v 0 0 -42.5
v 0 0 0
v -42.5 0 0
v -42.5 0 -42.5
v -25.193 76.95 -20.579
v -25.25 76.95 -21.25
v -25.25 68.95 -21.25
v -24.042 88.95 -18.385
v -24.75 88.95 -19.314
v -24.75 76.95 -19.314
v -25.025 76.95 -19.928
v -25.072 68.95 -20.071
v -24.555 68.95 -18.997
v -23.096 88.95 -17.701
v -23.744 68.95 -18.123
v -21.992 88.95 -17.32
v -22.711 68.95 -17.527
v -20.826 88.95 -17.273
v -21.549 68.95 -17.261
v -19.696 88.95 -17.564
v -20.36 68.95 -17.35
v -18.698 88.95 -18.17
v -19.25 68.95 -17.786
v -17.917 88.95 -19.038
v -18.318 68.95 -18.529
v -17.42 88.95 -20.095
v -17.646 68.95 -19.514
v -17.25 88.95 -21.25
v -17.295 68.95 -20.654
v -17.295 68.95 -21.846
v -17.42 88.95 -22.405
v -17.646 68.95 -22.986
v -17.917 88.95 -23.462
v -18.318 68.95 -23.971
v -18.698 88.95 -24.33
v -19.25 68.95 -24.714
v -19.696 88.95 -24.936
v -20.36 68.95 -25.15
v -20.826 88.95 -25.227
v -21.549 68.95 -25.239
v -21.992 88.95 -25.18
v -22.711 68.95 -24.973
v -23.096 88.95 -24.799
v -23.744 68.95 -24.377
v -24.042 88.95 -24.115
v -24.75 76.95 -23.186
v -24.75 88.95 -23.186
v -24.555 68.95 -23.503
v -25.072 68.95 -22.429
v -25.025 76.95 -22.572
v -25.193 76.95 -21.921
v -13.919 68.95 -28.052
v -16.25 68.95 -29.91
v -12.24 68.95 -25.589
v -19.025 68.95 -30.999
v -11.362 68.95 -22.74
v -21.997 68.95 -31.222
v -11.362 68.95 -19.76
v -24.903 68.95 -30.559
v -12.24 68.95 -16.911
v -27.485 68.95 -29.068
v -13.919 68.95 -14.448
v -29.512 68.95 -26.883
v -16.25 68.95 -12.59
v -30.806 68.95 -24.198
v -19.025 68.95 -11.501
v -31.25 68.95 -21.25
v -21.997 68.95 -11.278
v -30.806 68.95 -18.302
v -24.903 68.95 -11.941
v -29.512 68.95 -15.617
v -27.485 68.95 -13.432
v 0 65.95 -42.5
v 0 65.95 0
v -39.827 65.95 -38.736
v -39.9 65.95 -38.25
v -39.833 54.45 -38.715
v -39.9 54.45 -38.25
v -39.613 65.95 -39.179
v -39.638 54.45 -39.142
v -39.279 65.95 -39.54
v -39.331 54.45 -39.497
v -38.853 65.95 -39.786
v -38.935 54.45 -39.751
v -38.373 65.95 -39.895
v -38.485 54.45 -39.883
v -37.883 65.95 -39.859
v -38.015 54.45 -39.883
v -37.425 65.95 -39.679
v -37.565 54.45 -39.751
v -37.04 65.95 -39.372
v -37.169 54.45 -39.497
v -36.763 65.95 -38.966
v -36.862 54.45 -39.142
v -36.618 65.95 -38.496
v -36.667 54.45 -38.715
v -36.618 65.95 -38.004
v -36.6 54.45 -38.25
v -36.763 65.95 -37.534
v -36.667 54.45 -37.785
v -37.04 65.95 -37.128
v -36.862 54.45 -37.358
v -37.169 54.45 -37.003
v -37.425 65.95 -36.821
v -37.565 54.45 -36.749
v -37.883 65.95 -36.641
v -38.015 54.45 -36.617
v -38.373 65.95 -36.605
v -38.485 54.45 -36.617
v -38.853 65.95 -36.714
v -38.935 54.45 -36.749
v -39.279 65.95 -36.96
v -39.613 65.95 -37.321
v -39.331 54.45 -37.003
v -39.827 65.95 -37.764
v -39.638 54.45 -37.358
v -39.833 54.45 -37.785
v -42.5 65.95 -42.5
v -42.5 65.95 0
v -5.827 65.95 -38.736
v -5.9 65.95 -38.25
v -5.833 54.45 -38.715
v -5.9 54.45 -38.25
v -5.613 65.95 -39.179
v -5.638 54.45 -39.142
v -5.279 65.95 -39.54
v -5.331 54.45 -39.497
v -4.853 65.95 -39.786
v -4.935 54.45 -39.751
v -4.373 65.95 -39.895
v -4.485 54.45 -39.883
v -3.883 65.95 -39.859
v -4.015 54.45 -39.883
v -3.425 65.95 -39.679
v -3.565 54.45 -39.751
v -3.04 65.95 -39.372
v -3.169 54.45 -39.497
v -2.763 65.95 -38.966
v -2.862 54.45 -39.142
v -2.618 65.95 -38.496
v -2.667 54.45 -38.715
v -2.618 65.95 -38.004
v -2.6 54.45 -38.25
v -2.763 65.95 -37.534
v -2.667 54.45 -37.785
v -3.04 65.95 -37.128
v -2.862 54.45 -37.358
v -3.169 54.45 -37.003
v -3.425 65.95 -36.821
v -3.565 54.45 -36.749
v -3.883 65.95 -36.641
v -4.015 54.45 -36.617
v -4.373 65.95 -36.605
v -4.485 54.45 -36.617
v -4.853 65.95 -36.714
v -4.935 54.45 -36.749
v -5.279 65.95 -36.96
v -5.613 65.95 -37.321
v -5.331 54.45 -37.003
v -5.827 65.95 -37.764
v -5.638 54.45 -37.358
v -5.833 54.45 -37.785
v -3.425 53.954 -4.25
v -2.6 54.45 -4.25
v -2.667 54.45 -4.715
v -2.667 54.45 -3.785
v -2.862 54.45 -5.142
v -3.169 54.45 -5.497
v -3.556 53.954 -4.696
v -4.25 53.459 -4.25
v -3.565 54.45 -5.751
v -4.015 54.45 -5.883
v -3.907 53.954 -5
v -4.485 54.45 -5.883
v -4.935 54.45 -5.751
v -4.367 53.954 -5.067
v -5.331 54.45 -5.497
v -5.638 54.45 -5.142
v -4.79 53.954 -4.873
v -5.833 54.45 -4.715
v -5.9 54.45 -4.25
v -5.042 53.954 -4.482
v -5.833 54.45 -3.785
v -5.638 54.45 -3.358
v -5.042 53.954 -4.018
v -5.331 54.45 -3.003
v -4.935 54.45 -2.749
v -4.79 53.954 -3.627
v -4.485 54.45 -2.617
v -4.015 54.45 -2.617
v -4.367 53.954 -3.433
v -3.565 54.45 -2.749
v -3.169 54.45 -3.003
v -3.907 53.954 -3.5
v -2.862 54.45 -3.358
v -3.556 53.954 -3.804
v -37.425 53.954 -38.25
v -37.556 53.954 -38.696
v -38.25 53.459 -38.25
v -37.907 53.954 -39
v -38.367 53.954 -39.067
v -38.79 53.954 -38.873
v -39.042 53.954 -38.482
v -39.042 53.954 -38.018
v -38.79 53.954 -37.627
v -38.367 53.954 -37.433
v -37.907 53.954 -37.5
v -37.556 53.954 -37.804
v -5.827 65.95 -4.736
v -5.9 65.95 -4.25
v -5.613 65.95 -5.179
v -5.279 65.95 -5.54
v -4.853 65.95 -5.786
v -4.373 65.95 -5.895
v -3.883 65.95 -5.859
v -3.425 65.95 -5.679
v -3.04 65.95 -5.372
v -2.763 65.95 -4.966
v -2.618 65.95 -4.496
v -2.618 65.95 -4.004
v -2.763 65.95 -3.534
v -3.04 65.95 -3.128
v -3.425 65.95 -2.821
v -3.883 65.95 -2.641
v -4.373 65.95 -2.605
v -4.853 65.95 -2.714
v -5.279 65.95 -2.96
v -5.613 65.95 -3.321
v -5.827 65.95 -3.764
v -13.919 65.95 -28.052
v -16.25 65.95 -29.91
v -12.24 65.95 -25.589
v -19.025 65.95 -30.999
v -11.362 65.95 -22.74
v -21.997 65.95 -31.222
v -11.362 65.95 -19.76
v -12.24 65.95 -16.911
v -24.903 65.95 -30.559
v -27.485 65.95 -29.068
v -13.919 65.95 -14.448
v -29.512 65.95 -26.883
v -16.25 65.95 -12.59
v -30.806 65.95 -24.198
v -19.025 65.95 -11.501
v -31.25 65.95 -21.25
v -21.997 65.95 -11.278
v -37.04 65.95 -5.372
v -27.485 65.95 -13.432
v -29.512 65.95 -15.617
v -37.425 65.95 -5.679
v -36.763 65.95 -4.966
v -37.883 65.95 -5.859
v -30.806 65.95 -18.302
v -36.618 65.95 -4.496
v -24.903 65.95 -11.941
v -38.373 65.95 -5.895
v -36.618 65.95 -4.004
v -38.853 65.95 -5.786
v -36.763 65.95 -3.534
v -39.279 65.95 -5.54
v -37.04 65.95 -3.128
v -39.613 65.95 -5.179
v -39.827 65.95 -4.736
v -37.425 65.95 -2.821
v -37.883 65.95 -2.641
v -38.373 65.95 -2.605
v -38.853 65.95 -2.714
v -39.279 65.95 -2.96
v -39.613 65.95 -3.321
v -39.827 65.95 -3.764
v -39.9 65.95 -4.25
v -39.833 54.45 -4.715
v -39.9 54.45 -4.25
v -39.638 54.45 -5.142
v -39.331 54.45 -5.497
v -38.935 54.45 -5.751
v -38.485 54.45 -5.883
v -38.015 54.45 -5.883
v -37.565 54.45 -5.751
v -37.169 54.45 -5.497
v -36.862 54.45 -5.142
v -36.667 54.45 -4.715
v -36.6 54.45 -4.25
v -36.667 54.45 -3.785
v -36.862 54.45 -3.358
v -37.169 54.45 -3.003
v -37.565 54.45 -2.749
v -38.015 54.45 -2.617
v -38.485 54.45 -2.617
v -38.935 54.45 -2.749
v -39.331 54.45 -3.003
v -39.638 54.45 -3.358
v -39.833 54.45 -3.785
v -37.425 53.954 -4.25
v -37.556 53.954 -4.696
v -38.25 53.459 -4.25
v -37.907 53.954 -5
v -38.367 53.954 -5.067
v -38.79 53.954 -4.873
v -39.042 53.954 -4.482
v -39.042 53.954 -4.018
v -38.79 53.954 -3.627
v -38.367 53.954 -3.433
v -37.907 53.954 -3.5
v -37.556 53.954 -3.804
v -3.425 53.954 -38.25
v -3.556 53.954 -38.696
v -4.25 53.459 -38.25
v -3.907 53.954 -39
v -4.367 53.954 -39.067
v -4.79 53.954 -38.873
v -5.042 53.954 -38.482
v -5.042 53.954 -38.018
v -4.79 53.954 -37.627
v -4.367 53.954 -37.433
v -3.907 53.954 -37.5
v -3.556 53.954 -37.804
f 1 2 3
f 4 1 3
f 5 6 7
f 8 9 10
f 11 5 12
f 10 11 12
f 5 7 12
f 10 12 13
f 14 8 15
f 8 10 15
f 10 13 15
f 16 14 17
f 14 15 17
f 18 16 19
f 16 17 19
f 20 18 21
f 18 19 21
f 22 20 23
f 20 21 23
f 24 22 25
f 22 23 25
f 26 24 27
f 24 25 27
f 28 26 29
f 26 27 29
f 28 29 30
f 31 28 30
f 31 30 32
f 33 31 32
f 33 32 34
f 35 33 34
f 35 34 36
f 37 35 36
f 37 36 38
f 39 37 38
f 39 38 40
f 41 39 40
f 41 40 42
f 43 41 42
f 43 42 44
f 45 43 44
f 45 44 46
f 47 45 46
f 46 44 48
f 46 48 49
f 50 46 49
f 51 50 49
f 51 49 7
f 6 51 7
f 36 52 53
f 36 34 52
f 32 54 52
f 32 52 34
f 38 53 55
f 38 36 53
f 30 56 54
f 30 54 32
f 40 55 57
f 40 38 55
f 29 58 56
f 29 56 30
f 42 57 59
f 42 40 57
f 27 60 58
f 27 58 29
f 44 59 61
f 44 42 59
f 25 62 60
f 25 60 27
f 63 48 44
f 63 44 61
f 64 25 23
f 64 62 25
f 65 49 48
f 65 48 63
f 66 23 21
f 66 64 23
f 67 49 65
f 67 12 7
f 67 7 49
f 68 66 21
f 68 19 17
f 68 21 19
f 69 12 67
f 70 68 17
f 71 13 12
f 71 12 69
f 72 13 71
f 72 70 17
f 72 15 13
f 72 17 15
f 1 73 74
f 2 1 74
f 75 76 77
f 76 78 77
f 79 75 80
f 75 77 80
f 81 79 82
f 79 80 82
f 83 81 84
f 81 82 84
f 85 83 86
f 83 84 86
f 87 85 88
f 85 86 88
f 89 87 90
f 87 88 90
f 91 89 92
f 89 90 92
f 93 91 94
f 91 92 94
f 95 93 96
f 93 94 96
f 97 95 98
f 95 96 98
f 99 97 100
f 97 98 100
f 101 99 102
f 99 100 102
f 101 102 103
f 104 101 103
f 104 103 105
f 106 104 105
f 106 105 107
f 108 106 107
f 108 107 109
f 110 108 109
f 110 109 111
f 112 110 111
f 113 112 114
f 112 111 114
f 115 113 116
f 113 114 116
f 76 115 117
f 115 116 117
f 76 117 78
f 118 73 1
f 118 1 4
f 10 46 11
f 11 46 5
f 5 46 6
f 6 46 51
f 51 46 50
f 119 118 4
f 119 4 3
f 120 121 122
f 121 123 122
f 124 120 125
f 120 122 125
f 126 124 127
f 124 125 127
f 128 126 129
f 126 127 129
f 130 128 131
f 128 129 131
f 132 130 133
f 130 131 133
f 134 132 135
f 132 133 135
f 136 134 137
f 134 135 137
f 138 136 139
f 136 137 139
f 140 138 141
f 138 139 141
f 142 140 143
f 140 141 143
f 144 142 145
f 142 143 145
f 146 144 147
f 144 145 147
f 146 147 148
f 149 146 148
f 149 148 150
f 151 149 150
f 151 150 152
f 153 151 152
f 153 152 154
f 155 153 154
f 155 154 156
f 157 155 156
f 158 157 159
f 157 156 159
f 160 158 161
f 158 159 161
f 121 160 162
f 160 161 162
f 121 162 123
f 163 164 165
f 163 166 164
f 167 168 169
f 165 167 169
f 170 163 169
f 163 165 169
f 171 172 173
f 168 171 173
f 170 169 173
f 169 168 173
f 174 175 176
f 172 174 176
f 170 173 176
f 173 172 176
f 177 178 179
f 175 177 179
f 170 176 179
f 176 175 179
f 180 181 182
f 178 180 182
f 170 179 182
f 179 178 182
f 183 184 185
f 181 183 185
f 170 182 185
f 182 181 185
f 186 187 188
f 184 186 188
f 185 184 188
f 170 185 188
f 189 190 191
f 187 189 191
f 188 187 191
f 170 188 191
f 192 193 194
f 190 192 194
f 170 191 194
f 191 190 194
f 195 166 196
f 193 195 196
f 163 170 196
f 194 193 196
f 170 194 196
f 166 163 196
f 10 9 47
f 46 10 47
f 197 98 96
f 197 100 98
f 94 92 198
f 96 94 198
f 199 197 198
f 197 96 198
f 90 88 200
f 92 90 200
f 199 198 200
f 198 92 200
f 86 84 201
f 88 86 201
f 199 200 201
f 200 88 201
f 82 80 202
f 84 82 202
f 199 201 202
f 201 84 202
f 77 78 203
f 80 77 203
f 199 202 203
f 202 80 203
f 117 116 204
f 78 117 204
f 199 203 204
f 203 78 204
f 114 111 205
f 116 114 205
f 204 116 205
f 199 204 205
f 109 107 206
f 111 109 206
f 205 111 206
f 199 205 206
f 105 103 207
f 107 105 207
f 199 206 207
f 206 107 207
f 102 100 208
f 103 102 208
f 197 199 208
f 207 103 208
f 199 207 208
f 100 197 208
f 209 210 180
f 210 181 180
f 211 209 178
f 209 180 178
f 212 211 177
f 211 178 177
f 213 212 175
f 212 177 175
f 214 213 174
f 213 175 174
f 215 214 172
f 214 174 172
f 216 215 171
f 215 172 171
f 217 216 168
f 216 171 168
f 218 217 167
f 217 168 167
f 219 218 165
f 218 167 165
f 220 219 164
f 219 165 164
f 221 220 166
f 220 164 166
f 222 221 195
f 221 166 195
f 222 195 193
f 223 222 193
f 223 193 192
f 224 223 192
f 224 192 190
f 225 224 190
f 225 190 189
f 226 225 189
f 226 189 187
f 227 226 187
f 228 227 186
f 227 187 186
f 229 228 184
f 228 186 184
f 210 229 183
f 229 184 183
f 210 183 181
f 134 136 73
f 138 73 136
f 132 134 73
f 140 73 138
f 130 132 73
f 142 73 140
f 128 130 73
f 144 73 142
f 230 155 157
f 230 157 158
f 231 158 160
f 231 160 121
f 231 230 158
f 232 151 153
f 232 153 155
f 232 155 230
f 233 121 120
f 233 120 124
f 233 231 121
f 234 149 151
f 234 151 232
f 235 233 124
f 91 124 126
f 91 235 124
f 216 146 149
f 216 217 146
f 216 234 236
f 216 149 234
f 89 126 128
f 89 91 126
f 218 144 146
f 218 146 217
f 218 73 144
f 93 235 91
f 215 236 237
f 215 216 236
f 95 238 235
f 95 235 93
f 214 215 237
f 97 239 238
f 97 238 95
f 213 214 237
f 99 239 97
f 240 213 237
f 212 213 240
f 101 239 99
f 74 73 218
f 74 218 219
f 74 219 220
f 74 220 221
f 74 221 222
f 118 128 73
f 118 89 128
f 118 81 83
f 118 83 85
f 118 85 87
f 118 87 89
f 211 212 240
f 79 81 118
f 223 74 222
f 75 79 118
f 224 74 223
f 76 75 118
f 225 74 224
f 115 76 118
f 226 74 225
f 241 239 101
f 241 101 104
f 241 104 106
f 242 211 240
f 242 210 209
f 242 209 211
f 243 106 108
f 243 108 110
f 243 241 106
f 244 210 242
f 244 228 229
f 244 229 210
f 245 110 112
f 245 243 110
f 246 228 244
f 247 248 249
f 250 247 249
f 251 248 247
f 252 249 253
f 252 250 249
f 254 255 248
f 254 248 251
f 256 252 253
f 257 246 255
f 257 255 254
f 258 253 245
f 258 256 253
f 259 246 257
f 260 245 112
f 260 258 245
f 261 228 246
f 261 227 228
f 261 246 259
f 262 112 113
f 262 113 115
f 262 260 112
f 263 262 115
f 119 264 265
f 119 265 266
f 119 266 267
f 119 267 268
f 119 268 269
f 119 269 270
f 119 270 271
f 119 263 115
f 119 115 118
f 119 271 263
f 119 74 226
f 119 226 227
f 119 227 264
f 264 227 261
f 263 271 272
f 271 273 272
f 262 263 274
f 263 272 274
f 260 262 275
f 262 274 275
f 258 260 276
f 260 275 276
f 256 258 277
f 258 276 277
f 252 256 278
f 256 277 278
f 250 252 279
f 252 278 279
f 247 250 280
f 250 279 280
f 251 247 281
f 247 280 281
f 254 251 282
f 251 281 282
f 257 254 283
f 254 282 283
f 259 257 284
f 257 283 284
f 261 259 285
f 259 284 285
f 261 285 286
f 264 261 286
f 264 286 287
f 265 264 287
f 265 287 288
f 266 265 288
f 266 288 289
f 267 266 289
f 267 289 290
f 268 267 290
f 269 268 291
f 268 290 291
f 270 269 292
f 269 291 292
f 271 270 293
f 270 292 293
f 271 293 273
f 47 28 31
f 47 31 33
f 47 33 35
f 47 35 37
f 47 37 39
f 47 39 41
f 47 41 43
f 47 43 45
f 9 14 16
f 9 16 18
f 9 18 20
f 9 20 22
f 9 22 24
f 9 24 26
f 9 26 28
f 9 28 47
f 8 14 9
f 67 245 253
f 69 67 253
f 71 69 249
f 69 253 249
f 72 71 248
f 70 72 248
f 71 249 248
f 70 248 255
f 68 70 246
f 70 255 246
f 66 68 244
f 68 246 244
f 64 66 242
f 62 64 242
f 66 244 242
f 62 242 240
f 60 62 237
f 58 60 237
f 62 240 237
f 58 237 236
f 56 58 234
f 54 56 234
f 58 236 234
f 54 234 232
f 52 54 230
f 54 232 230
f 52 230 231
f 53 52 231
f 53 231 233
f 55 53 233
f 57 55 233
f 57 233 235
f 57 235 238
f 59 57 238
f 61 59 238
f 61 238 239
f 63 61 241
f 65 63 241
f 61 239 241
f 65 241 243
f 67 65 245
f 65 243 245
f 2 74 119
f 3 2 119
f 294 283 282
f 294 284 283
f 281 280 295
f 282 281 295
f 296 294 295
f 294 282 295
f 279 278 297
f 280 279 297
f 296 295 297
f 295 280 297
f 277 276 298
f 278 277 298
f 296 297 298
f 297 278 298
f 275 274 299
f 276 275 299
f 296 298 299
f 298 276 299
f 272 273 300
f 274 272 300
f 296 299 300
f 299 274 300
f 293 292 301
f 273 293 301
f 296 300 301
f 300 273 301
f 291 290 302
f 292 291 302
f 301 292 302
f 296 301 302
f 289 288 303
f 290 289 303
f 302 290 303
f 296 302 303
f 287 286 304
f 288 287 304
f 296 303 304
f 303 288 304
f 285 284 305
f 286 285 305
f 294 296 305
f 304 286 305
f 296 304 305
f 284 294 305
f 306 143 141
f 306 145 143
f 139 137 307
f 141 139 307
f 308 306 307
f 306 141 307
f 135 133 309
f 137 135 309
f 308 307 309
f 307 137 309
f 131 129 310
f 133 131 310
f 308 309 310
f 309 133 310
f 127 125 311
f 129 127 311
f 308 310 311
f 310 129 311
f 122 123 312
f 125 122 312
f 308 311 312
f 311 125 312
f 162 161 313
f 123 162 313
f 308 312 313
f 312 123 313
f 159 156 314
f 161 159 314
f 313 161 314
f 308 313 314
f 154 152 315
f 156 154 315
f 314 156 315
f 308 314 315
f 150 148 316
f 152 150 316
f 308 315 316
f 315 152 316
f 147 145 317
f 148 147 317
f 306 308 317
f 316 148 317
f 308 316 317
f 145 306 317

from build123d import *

# Parameters (mm, degrees)
SKETCH_1_W          = 42.5
SKETCH_1_H          = 42.5
EXTRUDE_1_DEPTH     = 65.95
SKETCH_2_R          = 10
EXTRUDE_2_DEPTH     = 3
SKETCH_3_R          = 4
EXTRUDE_3_DEPTH     = 20
HOLE_WIZARD_3_D     = 3.3
HOLE_WIZARD_3_DEPTH = 11.5
HOLE_WIZARD_3_TIP   = 0.991420021
EXTRUDE_4_DEPTH     = 12


with BuildPart() as part:
    # 스케치1 → 돌출1 (new body)
    with BuildSketch(Plane(origin=(0, 0, 0), x_dir=(-1, 0, 0), z_dir=(0, 1, 0))):
        with Locations((21.25, -21.25)):
            Rectangle(SKETCH_1_W, SKETCH_1_H)
    extrude(amount=EXTRUDE_1_DEPTH)

    # 스케치2 → 돌출2 (add)
    with BuildSketch(Plane(origin=(0, 65.95, 0), x_dir=(-1, 0, 0), z_dir=(0, 1, 0))):
        with Locations((21.25, -21.25)):
            Circle(SKETCH_2_R)
    extrude(amount=EXTRUDE_2_DEPTH)

    # 스케치3 → 돌출3 (add)
    with BuildSketch(Plane(origin=(0, 68.95, 0), x_dir=(-1, 0, 0), z_dir=(0, 1, 0))):
        with Locations((21.25, -21.25)):
            Circle(SKETCH_3_R)
    extrude(amount=EXTRUDE_3_DEPTH)

    # 구멍3
    with Locations(Plane(origin=(0, 65.95, 0), x_dir=(1, 0, 0), z_dir=(0, 1, 0))):
        with Locations((-4.25, 38.25), (-4.25, 4.25), (-38.25, 4.25), (-38.25, 38.25)):
            Hole(HOLE_WIZARD_3_D / 2, depth=HOLE_WIZARD_3_DEPTH)
            with Locations((0, 0, -(HOLE_WIZARD_3_DEPTH + HOLE_WIZARD_3_TIP / 2))):  # 118° drill point
                Cone(0, HOLE_WIZARD_3_D / 2, HOLE_WIZARD_3_TIP, mode=Mode.SUBTRACT)

    # 스케치6 → 돌출4 (cut)
    with BuildSketch(Plane(origin=(0, 88.95, 0), x_dir=(-1, 0, 0), z_dir=(0, 1, 0))):
        with BuildLine():
            Line((24.75, -19.313508327), (24.75, -23.186491673))
            ThreePointArc((24.75, -23.186491673), (25.25, -21.25), (24.75, -19.313508327))
        make_face()
    extrude(amount=-EXTRUDE_4_DEPTH, mode=Mode.SUBTRACT)


solid = part.part
